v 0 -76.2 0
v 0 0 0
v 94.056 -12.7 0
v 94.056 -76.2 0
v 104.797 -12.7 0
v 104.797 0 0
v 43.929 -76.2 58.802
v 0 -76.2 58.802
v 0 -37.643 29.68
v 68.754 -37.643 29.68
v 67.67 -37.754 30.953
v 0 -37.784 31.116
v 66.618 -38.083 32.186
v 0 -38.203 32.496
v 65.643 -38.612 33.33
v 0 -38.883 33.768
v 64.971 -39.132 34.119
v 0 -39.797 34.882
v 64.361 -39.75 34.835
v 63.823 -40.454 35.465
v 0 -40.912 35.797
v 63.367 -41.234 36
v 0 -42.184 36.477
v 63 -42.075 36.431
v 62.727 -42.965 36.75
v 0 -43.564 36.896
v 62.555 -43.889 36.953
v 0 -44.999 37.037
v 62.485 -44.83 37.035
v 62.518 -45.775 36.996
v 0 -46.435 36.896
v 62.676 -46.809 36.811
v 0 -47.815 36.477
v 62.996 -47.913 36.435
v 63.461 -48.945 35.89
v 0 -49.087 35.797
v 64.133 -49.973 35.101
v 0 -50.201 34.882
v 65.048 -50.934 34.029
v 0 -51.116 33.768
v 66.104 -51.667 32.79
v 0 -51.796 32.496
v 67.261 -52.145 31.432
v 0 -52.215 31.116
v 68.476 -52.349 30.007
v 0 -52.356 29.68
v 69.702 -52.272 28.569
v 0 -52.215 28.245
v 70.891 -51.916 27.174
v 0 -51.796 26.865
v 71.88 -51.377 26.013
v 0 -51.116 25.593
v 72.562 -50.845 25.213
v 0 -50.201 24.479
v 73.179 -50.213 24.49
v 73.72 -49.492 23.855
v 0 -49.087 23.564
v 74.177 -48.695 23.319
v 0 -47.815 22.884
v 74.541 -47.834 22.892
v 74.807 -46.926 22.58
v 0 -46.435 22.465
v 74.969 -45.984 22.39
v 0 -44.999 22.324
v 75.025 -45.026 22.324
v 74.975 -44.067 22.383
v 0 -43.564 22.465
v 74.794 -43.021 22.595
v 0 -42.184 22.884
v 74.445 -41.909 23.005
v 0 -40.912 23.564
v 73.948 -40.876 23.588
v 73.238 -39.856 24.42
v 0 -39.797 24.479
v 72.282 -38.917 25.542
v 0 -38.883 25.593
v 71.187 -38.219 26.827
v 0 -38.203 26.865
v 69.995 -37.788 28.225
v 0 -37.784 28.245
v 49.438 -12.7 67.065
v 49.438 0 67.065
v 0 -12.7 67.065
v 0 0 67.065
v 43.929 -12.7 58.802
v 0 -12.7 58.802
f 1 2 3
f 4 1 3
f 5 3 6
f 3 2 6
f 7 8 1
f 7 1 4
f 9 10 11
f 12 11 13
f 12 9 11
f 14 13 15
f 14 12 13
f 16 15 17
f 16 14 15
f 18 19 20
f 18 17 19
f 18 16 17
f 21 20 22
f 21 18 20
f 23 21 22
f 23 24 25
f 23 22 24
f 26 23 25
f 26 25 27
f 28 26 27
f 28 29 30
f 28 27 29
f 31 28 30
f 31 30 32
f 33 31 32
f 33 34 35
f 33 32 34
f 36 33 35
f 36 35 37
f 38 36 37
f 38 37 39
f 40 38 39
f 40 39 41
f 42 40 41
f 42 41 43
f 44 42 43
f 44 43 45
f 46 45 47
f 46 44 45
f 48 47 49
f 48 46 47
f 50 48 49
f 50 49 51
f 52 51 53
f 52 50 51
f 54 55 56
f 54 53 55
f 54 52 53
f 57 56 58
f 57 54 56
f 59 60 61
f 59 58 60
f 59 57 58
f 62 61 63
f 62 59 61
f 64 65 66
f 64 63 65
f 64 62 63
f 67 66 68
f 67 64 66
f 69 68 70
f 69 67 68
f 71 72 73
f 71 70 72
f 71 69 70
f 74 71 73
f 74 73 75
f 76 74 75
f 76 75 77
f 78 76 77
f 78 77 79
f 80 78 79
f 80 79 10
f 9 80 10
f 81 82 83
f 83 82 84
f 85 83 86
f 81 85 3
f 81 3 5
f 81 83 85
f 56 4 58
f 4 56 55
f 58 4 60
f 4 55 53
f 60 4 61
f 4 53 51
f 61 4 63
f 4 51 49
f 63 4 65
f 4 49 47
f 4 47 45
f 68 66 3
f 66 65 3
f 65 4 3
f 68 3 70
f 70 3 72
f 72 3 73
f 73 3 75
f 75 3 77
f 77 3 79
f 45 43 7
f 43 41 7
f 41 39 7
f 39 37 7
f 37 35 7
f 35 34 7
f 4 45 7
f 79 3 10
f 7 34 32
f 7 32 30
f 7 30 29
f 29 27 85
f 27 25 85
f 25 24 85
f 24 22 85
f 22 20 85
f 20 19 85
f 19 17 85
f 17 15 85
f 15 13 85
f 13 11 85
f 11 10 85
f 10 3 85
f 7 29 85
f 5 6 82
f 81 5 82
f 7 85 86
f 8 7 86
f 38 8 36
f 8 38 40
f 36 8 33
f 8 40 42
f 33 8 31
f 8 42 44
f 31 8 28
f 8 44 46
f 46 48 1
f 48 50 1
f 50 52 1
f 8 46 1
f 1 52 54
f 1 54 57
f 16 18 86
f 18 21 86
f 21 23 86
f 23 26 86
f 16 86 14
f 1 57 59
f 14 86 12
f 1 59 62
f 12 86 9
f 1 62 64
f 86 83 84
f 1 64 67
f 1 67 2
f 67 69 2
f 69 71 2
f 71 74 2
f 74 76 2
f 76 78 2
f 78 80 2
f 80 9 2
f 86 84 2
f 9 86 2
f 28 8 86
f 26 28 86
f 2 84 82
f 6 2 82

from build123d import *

# Parameters (mm, degrees)
F1_DEPTH = 76.2
F2_DEPTH = 12.7
F3_R     = 7.356687
F4_DEPTH = 104.797916


with BuildPart() as f1:
    # F0 (on Front) → F1 (new body)
    with BuildSketch(Plane.XZ):
        Polygon((0, 58.801956), (0, 0), (94.055586, 0), (43.929327, 58.801956), align=None)
    extrude(amount=F1_DEPTH)

    # F0 (on Front) → F2 (join)
    with BuildSketch(Plane.XZ):
        Polygon((0, 67.064524), (0, 58.801956), (43.929327, 58.801956), (94.055586, 0), (104.796916, 0), (49.437713, 67.064524), align=None)
    extrude(amount=F2_DEPTH)

    # F3 (on Right) → F4 (cut, through all)
    with BuildSketch(Plane.YZ):
        with Locations((-44.999432, 29.680481)):
            Circle(F3_R)
    extrude(amount=F4_DEPTH, mode=Mode.SUBTRACT)


solid = f1.part
